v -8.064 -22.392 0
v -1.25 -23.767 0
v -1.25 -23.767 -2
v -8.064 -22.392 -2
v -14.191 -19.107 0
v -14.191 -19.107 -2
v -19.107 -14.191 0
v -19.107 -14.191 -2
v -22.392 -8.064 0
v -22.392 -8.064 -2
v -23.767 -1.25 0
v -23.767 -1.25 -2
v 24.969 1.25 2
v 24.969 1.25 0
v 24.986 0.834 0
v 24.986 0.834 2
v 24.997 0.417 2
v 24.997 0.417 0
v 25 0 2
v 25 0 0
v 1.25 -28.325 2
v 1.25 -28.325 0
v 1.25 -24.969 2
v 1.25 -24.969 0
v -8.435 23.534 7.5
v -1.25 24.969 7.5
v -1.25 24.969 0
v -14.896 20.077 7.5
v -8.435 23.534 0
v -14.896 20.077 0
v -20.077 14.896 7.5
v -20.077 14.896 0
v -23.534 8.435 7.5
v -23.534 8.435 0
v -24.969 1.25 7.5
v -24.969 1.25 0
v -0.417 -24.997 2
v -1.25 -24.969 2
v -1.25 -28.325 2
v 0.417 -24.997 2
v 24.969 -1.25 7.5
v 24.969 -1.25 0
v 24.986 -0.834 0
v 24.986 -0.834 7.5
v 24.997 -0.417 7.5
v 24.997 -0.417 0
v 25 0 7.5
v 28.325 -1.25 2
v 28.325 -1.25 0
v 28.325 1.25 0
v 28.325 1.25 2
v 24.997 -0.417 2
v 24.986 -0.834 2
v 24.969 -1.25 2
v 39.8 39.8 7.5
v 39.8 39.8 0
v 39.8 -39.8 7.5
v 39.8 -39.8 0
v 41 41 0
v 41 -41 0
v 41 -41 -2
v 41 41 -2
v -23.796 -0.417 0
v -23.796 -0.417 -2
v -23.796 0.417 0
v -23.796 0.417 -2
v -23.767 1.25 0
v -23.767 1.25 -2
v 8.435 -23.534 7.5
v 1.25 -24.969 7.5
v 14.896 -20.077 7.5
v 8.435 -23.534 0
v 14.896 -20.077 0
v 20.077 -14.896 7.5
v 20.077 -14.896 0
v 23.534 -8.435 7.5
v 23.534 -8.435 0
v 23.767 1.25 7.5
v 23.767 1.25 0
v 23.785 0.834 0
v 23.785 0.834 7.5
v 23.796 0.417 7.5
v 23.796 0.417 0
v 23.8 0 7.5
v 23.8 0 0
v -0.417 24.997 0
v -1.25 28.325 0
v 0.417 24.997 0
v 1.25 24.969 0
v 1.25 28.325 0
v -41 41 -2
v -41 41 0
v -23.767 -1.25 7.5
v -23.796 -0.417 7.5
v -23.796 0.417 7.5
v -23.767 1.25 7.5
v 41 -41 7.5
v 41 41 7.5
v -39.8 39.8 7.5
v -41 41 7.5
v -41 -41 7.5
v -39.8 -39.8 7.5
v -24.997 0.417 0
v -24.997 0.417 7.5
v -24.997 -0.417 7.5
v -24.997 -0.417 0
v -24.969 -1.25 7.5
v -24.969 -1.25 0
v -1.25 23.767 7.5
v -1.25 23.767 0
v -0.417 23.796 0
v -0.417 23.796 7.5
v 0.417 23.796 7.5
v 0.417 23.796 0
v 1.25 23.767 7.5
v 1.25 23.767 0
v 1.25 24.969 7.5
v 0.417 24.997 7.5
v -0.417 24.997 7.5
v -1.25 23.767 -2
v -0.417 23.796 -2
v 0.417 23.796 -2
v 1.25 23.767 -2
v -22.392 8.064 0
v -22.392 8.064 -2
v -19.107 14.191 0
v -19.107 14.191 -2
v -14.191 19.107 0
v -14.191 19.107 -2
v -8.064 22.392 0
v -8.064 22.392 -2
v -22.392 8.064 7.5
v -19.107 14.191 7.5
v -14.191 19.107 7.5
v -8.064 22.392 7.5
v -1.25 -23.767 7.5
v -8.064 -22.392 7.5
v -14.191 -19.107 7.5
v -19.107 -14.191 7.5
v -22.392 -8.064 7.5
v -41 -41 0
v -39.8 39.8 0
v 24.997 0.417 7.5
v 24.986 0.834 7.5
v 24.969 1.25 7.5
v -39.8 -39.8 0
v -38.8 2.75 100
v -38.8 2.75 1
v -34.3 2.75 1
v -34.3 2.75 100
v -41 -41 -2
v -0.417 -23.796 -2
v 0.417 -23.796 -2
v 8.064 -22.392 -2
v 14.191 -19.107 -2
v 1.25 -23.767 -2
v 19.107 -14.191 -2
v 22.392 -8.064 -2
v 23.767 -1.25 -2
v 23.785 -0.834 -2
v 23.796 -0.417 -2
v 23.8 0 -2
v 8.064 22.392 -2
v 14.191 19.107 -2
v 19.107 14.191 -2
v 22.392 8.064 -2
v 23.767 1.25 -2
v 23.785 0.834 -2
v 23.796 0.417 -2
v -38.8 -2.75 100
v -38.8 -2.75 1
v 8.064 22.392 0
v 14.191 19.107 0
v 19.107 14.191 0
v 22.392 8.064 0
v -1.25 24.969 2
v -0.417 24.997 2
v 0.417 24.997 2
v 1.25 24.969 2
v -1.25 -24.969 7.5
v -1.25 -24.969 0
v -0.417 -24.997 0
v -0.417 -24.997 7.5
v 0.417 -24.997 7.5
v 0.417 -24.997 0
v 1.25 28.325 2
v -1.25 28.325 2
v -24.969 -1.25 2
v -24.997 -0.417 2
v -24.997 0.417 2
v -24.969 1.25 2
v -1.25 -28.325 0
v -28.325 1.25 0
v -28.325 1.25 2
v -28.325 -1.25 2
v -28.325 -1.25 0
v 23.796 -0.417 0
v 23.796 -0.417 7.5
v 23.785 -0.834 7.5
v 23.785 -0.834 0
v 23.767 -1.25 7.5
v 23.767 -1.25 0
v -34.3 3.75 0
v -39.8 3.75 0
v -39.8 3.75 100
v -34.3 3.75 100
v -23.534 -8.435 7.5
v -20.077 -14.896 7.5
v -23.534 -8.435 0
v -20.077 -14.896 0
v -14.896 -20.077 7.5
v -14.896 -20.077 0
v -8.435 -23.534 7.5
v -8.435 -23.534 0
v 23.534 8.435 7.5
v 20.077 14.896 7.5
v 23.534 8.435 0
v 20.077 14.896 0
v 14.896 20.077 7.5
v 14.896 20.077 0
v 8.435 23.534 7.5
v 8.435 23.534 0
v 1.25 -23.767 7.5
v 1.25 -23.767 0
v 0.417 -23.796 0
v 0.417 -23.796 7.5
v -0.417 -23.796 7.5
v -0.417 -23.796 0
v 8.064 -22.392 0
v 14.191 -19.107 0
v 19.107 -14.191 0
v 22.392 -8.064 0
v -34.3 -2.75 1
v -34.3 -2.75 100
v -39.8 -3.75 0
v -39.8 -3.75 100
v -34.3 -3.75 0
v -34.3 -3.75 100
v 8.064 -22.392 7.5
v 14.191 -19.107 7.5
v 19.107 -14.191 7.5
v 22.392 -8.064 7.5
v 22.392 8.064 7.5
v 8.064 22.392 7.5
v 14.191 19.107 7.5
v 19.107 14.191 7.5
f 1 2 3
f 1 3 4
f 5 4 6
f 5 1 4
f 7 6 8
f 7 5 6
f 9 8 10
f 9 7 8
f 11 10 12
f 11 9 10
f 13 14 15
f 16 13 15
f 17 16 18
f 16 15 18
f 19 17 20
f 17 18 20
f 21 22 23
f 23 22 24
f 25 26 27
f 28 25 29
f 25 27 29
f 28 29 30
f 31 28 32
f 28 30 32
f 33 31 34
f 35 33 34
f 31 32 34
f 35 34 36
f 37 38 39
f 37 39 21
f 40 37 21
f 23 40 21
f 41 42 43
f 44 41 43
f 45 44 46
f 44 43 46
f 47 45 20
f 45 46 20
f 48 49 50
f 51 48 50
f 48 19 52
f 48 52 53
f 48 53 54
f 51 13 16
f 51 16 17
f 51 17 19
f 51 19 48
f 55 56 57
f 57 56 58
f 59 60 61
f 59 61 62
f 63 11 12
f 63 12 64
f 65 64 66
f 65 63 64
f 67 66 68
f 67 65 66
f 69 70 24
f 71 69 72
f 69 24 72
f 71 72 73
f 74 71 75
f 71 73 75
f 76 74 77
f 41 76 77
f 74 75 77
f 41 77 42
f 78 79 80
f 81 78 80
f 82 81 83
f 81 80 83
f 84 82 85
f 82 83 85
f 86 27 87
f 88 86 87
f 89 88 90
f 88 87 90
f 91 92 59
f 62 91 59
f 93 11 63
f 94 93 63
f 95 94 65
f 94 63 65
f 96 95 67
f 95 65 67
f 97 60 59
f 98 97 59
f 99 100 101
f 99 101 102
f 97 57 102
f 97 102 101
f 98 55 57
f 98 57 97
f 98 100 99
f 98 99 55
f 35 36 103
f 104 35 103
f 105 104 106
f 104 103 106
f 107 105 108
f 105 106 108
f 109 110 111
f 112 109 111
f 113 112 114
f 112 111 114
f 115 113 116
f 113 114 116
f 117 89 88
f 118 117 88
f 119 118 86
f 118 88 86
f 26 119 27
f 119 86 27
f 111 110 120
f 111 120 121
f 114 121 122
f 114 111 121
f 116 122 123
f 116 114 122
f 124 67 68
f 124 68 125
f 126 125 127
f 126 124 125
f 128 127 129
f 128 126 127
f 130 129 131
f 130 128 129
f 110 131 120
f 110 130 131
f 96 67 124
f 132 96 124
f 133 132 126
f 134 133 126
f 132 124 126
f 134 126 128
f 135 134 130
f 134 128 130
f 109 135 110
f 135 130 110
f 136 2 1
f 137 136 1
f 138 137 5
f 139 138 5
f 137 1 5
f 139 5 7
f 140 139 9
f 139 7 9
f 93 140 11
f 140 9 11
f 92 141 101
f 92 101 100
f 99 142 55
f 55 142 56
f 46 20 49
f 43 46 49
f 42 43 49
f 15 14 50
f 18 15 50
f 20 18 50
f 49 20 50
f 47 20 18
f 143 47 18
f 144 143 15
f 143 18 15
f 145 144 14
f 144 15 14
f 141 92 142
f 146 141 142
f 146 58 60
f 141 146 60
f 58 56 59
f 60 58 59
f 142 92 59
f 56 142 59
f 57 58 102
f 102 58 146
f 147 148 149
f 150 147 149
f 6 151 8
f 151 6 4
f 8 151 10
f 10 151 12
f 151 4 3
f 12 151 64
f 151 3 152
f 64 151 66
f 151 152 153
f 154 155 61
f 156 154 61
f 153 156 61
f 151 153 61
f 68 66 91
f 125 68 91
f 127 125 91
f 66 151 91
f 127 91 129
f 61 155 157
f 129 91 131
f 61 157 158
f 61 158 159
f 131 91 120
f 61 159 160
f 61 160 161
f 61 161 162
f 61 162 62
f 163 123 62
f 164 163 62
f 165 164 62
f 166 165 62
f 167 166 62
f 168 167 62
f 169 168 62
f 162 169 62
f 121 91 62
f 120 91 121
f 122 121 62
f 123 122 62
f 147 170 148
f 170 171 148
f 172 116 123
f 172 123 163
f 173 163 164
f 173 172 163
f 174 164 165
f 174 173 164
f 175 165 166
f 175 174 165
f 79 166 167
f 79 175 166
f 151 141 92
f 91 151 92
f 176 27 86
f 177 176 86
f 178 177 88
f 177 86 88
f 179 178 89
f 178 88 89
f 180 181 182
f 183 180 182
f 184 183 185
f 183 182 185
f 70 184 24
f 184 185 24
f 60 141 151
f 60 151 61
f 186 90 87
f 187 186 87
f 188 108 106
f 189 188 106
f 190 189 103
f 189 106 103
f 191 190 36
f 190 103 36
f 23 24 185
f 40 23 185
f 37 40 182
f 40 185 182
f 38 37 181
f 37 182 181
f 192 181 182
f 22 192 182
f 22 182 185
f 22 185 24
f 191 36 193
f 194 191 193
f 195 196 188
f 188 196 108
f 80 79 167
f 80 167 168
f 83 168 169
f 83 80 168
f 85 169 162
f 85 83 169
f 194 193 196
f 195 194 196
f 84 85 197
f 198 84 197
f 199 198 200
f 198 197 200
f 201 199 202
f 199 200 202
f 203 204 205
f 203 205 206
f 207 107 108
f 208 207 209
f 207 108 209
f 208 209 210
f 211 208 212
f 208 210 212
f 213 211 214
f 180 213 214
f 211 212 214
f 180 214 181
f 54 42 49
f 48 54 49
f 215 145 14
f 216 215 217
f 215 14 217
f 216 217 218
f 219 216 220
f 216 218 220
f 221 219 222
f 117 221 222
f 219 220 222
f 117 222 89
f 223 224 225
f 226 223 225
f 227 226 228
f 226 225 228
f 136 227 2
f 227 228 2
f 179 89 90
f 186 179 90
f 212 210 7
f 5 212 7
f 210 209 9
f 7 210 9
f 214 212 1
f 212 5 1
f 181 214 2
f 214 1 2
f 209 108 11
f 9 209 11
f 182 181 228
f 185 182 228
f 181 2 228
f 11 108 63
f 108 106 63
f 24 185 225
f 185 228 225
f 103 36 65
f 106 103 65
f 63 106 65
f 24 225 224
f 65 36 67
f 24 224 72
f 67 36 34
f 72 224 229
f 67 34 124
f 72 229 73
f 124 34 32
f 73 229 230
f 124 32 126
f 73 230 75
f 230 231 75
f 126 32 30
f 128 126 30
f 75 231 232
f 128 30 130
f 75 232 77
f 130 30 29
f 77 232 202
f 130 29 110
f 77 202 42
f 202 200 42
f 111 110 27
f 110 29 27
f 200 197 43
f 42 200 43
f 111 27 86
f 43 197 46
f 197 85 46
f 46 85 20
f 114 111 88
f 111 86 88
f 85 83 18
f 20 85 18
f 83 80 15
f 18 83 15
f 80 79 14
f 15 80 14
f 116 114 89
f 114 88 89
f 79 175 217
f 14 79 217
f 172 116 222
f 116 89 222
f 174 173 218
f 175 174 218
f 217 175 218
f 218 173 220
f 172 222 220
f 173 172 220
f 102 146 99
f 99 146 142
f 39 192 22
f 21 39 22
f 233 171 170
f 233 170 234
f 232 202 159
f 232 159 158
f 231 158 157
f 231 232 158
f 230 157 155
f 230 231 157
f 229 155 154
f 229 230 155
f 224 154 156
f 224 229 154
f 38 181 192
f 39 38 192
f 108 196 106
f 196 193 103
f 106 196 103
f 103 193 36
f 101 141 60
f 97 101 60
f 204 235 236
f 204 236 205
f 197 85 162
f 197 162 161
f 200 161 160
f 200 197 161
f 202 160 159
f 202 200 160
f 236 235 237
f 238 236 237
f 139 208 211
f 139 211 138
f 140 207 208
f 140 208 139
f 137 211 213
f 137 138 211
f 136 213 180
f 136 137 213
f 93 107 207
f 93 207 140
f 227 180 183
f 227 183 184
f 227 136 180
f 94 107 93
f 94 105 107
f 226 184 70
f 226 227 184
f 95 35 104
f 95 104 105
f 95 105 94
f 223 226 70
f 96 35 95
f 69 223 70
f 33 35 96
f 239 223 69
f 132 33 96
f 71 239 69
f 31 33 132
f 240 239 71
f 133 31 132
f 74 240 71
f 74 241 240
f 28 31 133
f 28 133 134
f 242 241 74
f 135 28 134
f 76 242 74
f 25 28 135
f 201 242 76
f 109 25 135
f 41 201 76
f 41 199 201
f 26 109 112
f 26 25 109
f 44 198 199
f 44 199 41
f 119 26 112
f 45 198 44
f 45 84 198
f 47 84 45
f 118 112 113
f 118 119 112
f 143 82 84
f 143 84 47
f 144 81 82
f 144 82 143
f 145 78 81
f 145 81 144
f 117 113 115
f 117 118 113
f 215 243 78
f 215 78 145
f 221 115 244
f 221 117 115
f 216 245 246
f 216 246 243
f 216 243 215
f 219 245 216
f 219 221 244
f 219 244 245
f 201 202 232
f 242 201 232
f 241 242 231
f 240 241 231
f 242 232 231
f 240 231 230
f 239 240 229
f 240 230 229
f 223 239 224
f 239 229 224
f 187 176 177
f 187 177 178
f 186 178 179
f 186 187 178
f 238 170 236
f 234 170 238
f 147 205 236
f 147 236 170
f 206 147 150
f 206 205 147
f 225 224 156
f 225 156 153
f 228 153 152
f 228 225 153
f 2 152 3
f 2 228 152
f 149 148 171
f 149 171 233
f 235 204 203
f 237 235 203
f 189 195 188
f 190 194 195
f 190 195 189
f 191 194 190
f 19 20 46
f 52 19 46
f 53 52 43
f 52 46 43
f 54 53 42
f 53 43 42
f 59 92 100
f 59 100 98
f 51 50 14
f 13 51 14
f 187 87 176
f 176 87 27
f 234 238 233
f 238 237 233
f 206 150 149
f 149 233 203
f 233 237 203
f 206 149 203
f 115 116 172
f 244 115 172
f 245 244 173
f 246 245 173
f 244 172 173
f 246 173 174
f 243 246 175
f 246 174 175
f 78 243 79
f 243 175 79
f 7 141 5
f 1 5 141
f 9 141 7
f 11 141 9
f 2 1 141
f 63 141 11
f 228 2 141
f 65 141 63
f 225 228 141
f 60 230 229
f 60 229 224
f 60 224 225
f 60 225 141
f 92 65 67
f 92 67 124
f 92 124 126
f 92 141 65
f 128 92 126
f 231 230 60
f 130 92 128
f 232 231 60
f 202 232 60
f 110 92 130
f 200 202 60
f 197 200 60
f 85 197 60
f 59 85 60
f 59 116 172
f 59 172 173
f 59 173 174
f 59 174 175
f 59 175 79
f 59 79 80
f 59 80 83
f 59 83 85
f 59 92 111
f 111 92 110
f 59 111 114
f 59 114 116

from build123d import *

# Parameters (mm, degrees)
F1_DEPTH = 7.5
F0_W     = 82
F0_H     = 82
F0_R     = 32.8
F0_W_2   = 5.5
F0_H_2   = 7.5
F2_DEPTH = 2
F3_DEPTH = 2
F4_DEPTH = 100
F5_T     = -1


# Not quite as in the source:
# - a feature names something its author has since deleted; it is built from what else it names


with BuildPart() as f1:
    # F0 (on Top) → F1 (new body)
    with BuildSketch(Plane.XY):
        with BuildLine():
            ThreePointArc((-24.9687304443, -1.25), (-17.6776695297, -17.6776695297), (-1.25, -24.9687304443))
            Line((-1.25, -24.9687304443), (-1.25, -23.7671517015))
            ThreePointArc((-1.25, -23.7671517015), (-16.8291413922, -16.8291413922), (-23.7671517015, -1.25))
            Line((-23.7671517015, -1.25), (-24.9687304443, -1.25))
        make_face()
        with BuildLine():
            Line((-1.25, 23.7671517015), (-1.25, 24.9687304443))
            ThreePointArc((-1.25, 24.9687304443), (-17.6776695297, 17.6776695297), (-24.9687304443, 1.25))
            Line((-24.9687304443, 1.25), (-23.7671517015, 1.25))
            ThreePointArc((-23.7671517015, 1.25), (-16.8291413922, 16.8291413922), (-1.25, 23.7671517015))
        make_face()
        with BuildLine():
            Line((23.7671517015, 1.25), (24.9687304443, 1.25))
            ThreePointArc((24.9687304443, 1.25), (17.6776695297, 17.6776695297), (1.25, 24.9687304443))
            Line((1.25, 24.9687304443), (1.25, 23.7671517015))
            ThreePointArc((1.25, 23.7671517015), (16.8291413922, 16.8291413922), (23.7671517015, 1.25))
        make_face()
        with BuildLine():
            ThreePointArc((1.25, -24.9687304443), (17.6776695297, -17.6776695297), (24.9687304443, -1.25))
            Line((24.9687304443, -1.25), (23.7671517015, -1.25))
            ThreePointArc((23.7671517015, -1.25), (16.8291413922, -16.8291413922), (1.25, -23.7671517015))
            Line((1.25, -23.7671517015), (1.25, -24.9687304443))
        make_face()
        with BuildLine():
            Line((1.25, 23.7671517015), (1.25, 24.9687304443))
            ThreePointArc((1.25, 24.9687304443), (0, 25), (-1.25, 24.9687304443))
            Line((-1.25, 24.9687304443), (-1.25, 23.7671517015))
            ThreePointArc((-1.25, 23.7671517015), (0, 23.8), (1.25, 23.7671517015))
        make_face()
        with BuildLine():
            ThreePointArc((-1.25, -24.9687304443), (0, -25), (1.25, -24.9687304443))
            Line((1.25, -24.9687304443), (1.25, -23.7671517015))
            ThreePointArc((1.25, -23.7671517015), (0, -23.8), (-1.25, -23.7671517015))
            Line((-1.25, -23.7671517015), (-1.25, -24.9687304443))
        make_face()
        with BuildLine():
            ThreePointArc((24.9687304443, -1.25), (24.9921813885, -0.6251955264), (25, 0))
            ThreePointArc((25, 0), (24.9921813885, 0.6251955264), (24.9687304443, 1.25))
            Line((24.9687304443, 1.25), (23.7671517015, 1.25))
            ThreePointArc((23.7671517015, 1.25), (23.7917865081, 0.6252157649), (23.8, 0))
            ThreePointArc((23.8, 0), (23.7917865081, -0.6252157649), (23.7671517015, -1.25))
            Line((23.7671517015, -1.25), (24.9687304443, -1.25))
        make_face()
        with BuildLine():
            Line((-23.7671517015, 1.25), (-24.9687304443, 1.25))
            ThreePointArc((-24.9687304443, 1.25), (-25, 0), (-24.9687304443, -1.25))
            Line((-24.9687304443, -1.25), (-23.7671517015, -1.25))
            ThreePointArc((-23.7671517015, -1.25), (-23.8, 0), (-23.7671517015, 1.25))
        make_face()
    extrude(amount=F1_DEPTH)


with BuildPart() as f1b:
    # F0 (on Top) → F1, piece 2 (new body)
    with BuildSketch(Plane.XY):
        Rectangle(F0_W, F0_H)
        Polygon((-39.8, 3.75), (-39.8, 39.8), (39.8, 39.8), (39.8, -39.8), (-39.8, -39.8), (-39.8, -3.75), align=None, mode=Mode.SUBTRACT)
    extrude(amount=F1_DEPTH)


with BuildPart() as f2:
    # F0 (on Top) → F2 (new body)
    with BuildSketch(Plane.XY):
        Rectangle(F0_W, F0_H)
        Polygon((-39.8, 3.75), (-39.8, 39.8), (39.8, 39.8), (39.8, -39.8), (-39.8, -39.8), (-39.8, -3.75), align=None, mode=Mode.SUBTRACT)
        Polygon((39.8, 39.8), (-39.8, 39.8), (-39.8, 3.75), (-34.3, 3.75), (-34.3, -3.75), (-39.8, -3.75), (-39.8, -39.8), (39.8, -39.8), align=None)
        Circle(F0_R, mode=Mode.SUBTRACT)
        Circle(F0_R)
        with BuildLine():
            ThreePointArc((1.25, 24.9687304443), (17.6776695297, 17.6776695297), (24.9687304443, 1.25))
            Line((24.9687304443, 1.25), (28.325, 1.25))
            Line((28.325, 1.25), (28.325, -1.25))
            Line((28.325, -1.25), (24.9687304443, -1.25))
            ThreePointArc((24.9687304443, -1.25), (17.6776695297, -17.6776695297), (1.25, -24.9687304443))
            Line((1.25, -24.9687304443), (1.25, -28.325))
            Line((1.25, -28.325), (-1.25, -28.325))
            Line((-1.25, -28.325), (-1.25, -24.9687304443))
            ThreePointArc((-1.25, -24.9687304443), (-17.6776695297, -17.6776695297), (-24.9687304443, -1.25))
            Line((-24.9687304443, -1.25), (-28.325, -1.25))
            Line((-28.325, -1.25), (-28.325, 1.25))
            Line((-28.325, 1.25), (-24.9687304443, 1.25))
            ThreePointArc((-24.9687304443, 1.25), (-17.6776695297, 17.6776695297), (-1.25, 24.9687304443))
            Line((-1.25, 24.9687304443), (-1.25, 28.325))
            Line((-1.25, 28.325), (1.25, 28.325))
            Line((1.25, 28.325), (1.25, 24.9687304443))
        make_face(mode=Mode.SUBTRACT)
        with BuildLine():
            Line((23.7671517015, 1.25), (24.9687304443, 1.25))
            ThreePointArc((24.9687304443, 1.25), (17.6776695297, 17.6776695297), (1.25, 24.9687304443))
            Line((1.25, 24.9687304443), (1.25, 23.7671517015))
            ThreePointArc((1.25, 23.7671517015), (16.8291413922, 16.8291413922), (23.7671517015, 1.25))
        make_face()
        with BuildLine():
            Line((-1.25, 23.7671517015), (-1.25, 24.9687304443))
            ThreePointArc((-1.25, 24.9687304443), (-17.6776695297, 17.6776695297), (-24.9687304443, 1.25))
            Line((-24.9687304443, 1.25), (-23.7671517015, 1.25))
            ThreePointArc((-23.7671517015, 1.25), (-16.8291413922, 16.8291413922), (-1.25, 23.7671517015))
        make_face()
        with BuildLine():
            ThreePointArc((-24.9687304443, -1.25), (-17.6776695297, -17.6776695297), (-1.25, -24.9687304443))
            Line((-1.25, -24.9687304443), (-1.25, -23.7671517015))
            ThreePointArc((-1.25, -23.7671517015), (-16.8291413922, -16.8291413922), (-23.7671517015, -1.25))
            Line((-23.7671517015, -1.25), (-24.9687304443, -1.25))
        make_face()
        with BuildLine():
            ThreePointArc((1.25, -24.9687304443), (17.6776695297, -17.6776695297), (24.9687304443, -1.25))
            Line((24.9687304443, -1.25), (23.7671517015, -1.25))
            ThreePointArc((23.7671517015, -1.25), (16.8291413922, -16.8291413922), (1.25, -23.7671517015))
            Line((1.25, -23.7671517015), (1.25, -24.9687304443))
        make_face()
        with Locations((-37.05, 0)):
            Rectangle(F0_W_2, F0_H_2)
        with BuildLine():
            ThreePointArc((-24.9687304443, -1.25), (-25, 0), (-24.9687304443, 1.25))
            Line((-24.9687304443, 1.25), (-28.325, 1.25))
            Line((-28.325, 1.25), (-28.325, -1.25))
            Line((-28.325, -1.25), (-24.9687304443, -1.25))
        make_face()
        with BuildLine():
            Line((1.25, -28.325), (1.25, -24.9687304443))
            ThreePointArc((1.25, -24.9687304443), (0, -25), (-1.25, -24.9687304443))
            Line((-1.25, -24.9687304443), (-1.25, -28.325))
            Line((-1.25, -28.325), (1.25, -28.325))
        make_face()
        with BuildLine():
            ThreePointArc((-1.25, 24.9687304443), (0, 25), (1.25, 24.9687304443))
            Line((1.25, 24.9687304443), (1.25, 28.325))
            Line((1.25, 28.325), (-1.25, 28.325))
            Line((-1.25, 28.325), (-1.25, 24.9687304443))
        make_face()
        with BuildLine():
            ThreePointArc((24.9687304443, 1.25), (24.9921813885, 0.6251955264), (25, 0))
            ThreePointArc((25, 0), (24.9921813885, -0.6251955264), (24.9687304443, -1.25))
            Line((24.9687304443, -1.25), (28.325, -1.25))
            Line((28.325, -1.25), (28.325, 1.25))
            Line((28.325, 1.25), (24.9687304443, 1.25))
        make_face()
        with BuildLine():
            Line((1.25, 23.7671517015), (1.25, 24.9687304443))
            ThreePointArc((1.25, 24.9687304443), (0, 25), (-1.25, 24.9687304443))
            Line((-1.25, 24.9687304443), (-1.25, 23.7671517015))
            ThreePointArc((-1.25, 23.7671517015), (0, 23.8), (1.25, 23.7671517015))
        make_face()
        with BuildLine():
            Line((-23.7671517015, 1.25), (-24.9687304443, 1.25))
            ThreePointArc((-24.9687304443, 1.25), (-25, 0), (-24.9687304443, -1.25))
            Line((-24.9687304443, -1.25), (-23.7671517015, -1.25))
            ThreePointArc((-23.7671517015, -1.25), (-23.8, 0), (-23.7671517015, 1.25))
        make_face()
        with BuildLine():
            ThreePointArc((-1.25, -24.9687304443), (0, -25), (1.25, -24.9687304443))
            Line((1.25, -24.9687304443), (1.25, -23.7671517015))
            ThreePointArc((1.25, -23.7671517015), (0, -23.8), (-1.25, -23.7671517015))
            Line((-1.25, -23.7671517015), (-1.25, -24.9687304443))
        make_face()
        with BuildLine():
            ThreePointArc((24.9687304443, -1.25), (24.9921813885, -0.6251955264), (25, 0))
            ThreePointArc((25, 0), (24.9921813885, 0.6251955264), (24.9687304443, 1.25))
            Line((24.9687304443, 1.25), (23.7671517015, 1.25))
            ThreePointArc((23.7671517015, 1.25), (23.7917865081, 0.6252157649), (23.8, 0))
            ThreePointArc((23.8, 0), (23.7917865081, -0.6252157649), (23.7671517015, -1.25))
            Line((23.7671517015, -1.25), (24.9687304443, -1.25))
        make_face()
    extrude(amount=-F2_DEPTH)


with BuildPart() as f3:
    # F0 (on Top) → F3 (new body)
    with BuildSketch(Plane.XY):
        with BuildLine():
            ThreePointArc((-24.9687304443, -1.25), (-25, 0), (-24.9687304443, 1.25))
            Line((-24.9687304443, 1.25), (-28.325, 1.25))
            Line((-28.325, 1.25), (-28.325, -1.25))
            Line((-28.325, -1.25), (-24.9687304443, -1.25))
        make_face()
    extrude(amount=F3_DEPTH)


with BuildPart() as f3b:
    # F0 (on Top) → F3, piece 2 (new body)
    with BuildSketch(Plane.XY):
        with BuildLine():
            ThreePointArc((-1.25, 24.9687304443), (0, 25), (1.25, 24.9687304443))
            Line((1.25, 24.9687304443), (1.25, 28.325))
            Line((1.25, 28.325), (-1.25, 28.325))
            Line((-1.25, 28.325), (-1.25, 24.9687304443))
        make_face()
    extrude(amount=F3_DEPTH)


with BuildPart() as f3c:
    # F0 (on Top) → F3, piece 3 (new body)
    with BuildSketch(Plane.XY):
        with BuildLine():
            ThreePointArc((24.9687304443, 1.25), (24.9921813885, 0.6251955264), (25, 0))
            ThreePointArc((25, 0), (24.9921813885, -0.6251955264), (24.9687304443, -1.25))
            Line((24.9687304443, -1.25), (28.325, -1.25))
            Line((28.325, -1.25), (28.325, 1.25))
            Line((28.325, 1.25), (24.9687304443, 1.25))
        make_face()
    extrude(amount=F3_DEPTH)


with BuildPart() as f3d:
    # F0 (on Top) → F3, piece 4 (new body)
    with BuildSketch(Plane.XY):
        with BuildLine():
            Line((1.25, -28.325), (1.25, -24.9687304443))
            ThreePointArc((1.25, -24.9687304443), (0, -25), (-1.25, -24.9687304443))
            Line((-1.25, -24.9687304443), (-1.25, -28.325))
            Line((-1.25, -28.325), (1.25, -28.325))
        make_face()
    extrude(amount=F3_DEPTH)


with BuildPart() as f4:
    # F0 (on Top) → F4 (new body)
    with BuildSketch(Plane.XY):
        with Locations((-37.05, 0)):
            Rectangle(F0_W_2, F0_H_2)
    extrude(amount=F4_DEPTH)

    # F5
    f5_openings = [f4.faces().sort_by_distance(p)[0] for p in [
        (-37.05, 0, 100),
        (-34.3, 0, 50),
    ]]
    offset(amount=F5_T, openings=f5_openings)


solid = Compound([f1.part, f1b.part, f2.part, f3.part, f3b.part, f3c.part, f3d.part, f4.part])
